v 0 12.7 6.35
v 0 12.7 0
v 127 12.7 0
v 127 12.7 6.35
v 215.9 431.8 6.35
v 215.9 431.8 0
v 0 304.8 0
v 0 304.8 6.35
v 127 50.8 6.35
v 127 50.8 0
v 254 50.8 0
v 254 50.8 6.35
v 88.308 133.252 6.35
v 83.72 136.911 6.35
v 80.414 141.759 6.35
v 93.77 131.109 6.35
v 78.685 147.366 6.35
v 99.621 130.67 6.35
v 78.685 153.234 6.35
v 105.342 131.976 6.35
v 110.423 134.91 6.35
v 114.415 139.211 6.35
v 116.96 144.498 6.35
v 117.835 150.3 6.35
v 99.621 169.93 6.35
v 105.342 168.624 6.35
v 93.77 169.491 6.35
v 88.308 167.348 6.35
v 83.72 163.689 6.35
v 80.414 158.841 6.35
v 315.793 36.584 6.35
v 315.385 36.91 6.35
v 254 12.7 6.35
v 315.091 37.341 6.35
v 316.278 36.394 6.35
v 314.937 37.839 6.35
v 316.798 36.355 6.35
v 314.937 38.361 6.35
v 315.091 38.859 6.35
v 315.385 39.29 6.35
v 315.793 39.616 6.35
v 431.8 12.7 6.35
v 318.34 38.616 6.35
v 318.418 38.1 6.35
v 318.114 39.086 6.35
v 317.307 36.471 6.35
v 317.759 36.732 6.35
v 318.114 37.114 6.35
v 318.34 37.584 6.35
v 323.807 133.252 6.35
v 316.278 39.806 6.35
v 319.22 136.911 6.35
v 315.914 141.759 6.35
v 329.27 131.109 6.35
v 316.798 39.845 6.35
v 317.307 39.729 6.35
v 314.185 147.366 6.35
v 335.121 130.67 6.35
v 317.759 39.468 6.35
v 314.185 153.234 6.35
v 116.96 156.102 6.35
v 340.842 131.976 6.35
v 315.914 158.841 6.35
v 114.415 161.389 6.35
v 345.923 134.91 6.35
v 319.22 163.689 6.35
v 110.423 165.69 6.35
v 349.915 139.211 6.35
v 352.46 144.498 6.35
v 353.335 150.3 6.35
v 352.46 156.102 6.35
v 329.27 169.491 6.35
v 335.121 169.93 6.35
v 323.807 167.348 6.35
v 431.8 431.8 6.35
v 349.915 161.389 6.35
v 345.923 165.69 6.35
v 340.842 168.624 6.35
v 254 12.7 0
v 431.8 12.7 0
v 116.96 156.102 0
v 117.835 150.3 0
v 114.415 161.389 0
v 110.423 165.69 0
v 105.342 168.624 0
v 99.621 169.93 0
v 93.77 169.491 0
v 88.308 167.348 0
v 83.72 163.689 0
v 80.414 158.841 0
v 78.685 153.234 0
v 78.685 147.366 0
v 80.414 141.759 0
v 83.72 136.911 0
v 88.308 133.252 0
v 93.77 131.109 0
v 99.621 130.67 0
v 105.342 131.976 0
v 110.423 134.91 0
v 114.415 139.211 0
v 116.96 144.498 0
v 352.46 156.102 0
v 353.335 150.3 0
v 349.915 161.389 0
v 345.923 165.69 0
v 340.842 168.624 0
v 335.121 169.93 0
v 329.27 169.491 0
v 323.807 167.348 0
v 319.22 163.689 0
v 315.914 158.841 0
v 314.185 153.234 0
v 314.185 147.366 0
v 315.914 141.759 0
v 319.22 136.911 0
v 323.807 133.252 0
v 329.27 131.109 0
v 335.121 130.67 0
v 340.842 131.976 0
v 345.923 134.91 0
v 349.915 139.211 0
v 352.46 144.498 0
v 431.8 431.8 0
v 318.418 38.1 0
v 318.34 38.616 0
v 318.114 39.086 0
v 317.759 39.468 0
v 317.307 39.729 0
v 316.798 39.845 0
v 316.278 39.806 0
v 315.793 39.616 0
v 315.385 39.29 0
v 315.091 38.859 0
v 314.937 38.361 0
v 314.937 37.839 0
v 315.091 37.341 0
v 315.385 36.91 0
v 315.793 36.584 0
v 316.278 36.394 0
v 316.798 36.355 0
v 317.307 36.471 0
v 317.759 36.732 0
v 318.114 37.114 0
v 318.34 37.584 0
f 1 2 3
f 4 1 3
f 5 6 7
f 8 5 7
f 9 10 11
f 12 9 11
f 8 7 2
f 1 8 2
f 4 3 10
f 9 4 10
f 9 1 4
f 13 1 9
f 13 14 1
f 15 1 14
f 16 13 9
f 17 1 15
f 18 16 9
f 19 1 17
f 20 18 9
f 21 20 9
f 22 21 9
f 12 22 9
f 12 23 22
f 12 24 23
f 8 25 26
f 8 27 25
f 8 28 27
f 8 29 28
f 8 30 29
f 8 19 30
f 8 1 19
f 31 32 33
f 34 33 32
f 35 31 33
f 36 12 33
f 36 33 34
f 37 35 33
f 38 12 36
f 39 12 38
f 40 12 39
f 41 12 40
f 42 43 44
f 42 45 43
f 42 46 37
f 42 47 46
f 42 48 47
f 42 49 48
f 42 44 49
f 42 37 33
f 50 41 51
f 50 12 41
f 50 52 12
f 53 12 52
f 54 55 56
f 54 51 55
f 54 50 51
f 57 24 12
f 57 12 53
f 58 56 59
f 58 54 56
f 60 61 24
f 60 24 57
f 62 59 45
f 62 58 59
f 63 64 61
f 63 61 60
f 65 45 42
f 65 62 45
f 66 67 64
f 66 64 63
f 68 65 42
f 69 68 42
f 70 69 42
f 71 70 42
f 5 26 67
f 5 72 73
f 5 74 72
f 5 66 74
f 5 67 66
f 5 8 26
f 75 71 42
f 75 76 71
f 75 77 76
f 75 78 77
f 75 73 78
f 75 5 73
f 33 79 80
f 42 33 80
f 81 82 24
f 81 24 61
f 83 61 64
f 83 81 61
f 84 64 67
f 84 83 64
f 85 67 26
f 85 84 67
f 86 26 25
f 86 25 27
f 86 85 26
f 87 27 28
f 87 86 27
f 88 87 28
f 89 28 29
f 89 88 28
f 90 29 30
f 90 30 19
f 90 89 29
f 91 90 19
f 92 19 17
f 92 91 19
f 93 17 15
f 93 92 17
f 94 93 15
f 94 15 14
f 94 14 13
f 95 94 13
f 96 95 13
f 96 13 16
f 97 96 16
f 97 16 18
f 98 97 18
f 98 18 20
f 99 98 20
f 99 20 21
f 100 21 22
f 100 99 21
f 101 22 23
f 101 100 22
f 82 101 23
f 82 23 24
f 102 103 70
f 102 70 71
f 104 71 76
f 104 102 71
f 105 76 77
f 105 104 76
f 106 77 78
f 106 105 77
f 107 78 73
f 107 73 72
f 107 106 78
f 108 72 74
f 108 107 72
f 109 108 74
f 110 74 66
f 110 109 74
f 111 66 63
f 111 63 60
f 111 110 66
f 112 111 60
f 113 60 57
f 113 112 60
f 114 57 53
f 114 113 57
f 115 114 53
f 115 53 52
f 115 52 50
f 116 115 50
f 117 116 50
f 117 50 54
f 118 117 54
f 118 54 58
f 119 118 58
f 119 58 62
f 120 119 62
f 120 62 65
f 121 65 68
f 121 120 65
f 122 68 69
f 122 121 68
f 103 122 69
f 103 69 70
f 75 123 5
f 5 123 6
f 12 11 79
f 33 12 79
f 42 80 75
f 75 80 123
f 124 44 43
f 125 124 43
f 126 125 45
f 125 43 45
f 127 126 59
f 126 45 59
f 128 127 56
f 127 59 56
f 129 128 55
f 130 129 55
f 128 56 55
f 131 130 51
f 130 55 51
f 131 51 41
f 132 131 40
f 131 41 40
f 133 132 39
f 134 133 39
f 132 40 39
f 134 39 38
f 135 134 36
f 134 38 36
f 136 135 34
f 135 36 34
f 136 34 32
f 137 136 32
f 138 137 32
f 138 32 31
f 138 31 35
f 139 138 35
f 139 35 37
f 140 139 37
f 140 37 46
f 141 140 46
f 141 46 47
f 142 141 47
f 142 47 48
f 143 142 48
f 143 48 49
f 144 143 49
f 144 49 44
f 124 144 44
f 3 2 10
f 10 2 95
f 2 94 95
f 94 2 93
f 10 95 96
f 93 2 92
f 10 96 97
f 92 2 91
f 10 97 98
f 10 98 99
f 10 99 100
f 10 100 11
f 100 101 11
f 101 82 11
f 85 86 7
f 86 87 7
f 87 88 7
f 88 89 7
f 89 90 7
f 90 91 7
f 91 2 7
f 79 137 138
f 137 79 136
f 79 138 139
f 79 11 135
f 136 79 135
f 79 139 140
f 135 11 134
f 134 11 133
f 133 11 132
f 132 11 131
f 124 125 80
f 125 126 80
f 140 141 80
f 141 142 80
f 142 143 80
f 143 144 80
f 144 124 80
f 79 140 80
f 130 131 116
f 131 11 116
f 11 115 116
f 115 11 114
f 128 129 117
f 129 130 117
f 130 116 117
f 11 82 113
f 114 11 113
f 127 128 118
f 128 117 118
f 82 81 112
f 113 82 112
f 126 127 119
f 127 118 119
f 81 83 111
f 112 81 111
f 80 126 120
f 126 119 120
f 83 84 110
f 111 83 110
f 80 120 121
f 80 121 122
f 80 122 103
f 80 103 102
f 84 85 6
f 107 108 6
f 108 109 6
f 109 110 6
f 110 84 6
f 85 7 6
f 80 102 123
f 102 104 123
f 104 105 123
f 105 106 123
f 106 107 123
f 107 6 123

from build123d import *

# Parameters (mm, degrees)
FRAME_EXTERIOR_MASTER_OUTLINE_R = 19.685
FRAME_EXTERIOR_MASTER_DEPTH     = 6.35
SKETCH1_R                       = 1.75
CUT_EXTRUDE1_DEPTH              = 611.690430988


# Read off the part's stored shape, not the designer's step: Frame Exterior Master
with BuildPart() as part:
    # Frame Exterior Master outline → Frame Exterior Master (new body)
    with BuildSketch(Plane.XY):
        Polygon((431.8, 12.7), (431.8, 431.8), (215.9, 431.8), (0, 304.8), (0, 12.7), (127, 12.7), (127, 50.8), (254, 50.8), (254, 12.7), align=None)
        with Locations((98.15, 150.3)):
            Circle(FRAME_EXTERIOR_MASTER_OUTLINE_R, mode=Mode.SUBTRACT)
        with Locations((333.65, 150.3)):
            Circle(FRAME_EXTERIOR_MASTER_OUTLINE_R, mode=Mode.SUBTRACT)
    extrude(amount=FRAME_EXTERIOR_MASTER_DEPTH)

    # Sketch1 → Cut-Extrude1 (cut, through all)
    with BuildSketch(Plane.XY.offset(6.35)):
        with Locations((316.667678943, 38.1)):
            Circle(SKETCH1_R)
    extrude(amount=-CUT_EXTRUDE1_DEPTH, mode=Mode.SUBTRACT)


solid = part.part
